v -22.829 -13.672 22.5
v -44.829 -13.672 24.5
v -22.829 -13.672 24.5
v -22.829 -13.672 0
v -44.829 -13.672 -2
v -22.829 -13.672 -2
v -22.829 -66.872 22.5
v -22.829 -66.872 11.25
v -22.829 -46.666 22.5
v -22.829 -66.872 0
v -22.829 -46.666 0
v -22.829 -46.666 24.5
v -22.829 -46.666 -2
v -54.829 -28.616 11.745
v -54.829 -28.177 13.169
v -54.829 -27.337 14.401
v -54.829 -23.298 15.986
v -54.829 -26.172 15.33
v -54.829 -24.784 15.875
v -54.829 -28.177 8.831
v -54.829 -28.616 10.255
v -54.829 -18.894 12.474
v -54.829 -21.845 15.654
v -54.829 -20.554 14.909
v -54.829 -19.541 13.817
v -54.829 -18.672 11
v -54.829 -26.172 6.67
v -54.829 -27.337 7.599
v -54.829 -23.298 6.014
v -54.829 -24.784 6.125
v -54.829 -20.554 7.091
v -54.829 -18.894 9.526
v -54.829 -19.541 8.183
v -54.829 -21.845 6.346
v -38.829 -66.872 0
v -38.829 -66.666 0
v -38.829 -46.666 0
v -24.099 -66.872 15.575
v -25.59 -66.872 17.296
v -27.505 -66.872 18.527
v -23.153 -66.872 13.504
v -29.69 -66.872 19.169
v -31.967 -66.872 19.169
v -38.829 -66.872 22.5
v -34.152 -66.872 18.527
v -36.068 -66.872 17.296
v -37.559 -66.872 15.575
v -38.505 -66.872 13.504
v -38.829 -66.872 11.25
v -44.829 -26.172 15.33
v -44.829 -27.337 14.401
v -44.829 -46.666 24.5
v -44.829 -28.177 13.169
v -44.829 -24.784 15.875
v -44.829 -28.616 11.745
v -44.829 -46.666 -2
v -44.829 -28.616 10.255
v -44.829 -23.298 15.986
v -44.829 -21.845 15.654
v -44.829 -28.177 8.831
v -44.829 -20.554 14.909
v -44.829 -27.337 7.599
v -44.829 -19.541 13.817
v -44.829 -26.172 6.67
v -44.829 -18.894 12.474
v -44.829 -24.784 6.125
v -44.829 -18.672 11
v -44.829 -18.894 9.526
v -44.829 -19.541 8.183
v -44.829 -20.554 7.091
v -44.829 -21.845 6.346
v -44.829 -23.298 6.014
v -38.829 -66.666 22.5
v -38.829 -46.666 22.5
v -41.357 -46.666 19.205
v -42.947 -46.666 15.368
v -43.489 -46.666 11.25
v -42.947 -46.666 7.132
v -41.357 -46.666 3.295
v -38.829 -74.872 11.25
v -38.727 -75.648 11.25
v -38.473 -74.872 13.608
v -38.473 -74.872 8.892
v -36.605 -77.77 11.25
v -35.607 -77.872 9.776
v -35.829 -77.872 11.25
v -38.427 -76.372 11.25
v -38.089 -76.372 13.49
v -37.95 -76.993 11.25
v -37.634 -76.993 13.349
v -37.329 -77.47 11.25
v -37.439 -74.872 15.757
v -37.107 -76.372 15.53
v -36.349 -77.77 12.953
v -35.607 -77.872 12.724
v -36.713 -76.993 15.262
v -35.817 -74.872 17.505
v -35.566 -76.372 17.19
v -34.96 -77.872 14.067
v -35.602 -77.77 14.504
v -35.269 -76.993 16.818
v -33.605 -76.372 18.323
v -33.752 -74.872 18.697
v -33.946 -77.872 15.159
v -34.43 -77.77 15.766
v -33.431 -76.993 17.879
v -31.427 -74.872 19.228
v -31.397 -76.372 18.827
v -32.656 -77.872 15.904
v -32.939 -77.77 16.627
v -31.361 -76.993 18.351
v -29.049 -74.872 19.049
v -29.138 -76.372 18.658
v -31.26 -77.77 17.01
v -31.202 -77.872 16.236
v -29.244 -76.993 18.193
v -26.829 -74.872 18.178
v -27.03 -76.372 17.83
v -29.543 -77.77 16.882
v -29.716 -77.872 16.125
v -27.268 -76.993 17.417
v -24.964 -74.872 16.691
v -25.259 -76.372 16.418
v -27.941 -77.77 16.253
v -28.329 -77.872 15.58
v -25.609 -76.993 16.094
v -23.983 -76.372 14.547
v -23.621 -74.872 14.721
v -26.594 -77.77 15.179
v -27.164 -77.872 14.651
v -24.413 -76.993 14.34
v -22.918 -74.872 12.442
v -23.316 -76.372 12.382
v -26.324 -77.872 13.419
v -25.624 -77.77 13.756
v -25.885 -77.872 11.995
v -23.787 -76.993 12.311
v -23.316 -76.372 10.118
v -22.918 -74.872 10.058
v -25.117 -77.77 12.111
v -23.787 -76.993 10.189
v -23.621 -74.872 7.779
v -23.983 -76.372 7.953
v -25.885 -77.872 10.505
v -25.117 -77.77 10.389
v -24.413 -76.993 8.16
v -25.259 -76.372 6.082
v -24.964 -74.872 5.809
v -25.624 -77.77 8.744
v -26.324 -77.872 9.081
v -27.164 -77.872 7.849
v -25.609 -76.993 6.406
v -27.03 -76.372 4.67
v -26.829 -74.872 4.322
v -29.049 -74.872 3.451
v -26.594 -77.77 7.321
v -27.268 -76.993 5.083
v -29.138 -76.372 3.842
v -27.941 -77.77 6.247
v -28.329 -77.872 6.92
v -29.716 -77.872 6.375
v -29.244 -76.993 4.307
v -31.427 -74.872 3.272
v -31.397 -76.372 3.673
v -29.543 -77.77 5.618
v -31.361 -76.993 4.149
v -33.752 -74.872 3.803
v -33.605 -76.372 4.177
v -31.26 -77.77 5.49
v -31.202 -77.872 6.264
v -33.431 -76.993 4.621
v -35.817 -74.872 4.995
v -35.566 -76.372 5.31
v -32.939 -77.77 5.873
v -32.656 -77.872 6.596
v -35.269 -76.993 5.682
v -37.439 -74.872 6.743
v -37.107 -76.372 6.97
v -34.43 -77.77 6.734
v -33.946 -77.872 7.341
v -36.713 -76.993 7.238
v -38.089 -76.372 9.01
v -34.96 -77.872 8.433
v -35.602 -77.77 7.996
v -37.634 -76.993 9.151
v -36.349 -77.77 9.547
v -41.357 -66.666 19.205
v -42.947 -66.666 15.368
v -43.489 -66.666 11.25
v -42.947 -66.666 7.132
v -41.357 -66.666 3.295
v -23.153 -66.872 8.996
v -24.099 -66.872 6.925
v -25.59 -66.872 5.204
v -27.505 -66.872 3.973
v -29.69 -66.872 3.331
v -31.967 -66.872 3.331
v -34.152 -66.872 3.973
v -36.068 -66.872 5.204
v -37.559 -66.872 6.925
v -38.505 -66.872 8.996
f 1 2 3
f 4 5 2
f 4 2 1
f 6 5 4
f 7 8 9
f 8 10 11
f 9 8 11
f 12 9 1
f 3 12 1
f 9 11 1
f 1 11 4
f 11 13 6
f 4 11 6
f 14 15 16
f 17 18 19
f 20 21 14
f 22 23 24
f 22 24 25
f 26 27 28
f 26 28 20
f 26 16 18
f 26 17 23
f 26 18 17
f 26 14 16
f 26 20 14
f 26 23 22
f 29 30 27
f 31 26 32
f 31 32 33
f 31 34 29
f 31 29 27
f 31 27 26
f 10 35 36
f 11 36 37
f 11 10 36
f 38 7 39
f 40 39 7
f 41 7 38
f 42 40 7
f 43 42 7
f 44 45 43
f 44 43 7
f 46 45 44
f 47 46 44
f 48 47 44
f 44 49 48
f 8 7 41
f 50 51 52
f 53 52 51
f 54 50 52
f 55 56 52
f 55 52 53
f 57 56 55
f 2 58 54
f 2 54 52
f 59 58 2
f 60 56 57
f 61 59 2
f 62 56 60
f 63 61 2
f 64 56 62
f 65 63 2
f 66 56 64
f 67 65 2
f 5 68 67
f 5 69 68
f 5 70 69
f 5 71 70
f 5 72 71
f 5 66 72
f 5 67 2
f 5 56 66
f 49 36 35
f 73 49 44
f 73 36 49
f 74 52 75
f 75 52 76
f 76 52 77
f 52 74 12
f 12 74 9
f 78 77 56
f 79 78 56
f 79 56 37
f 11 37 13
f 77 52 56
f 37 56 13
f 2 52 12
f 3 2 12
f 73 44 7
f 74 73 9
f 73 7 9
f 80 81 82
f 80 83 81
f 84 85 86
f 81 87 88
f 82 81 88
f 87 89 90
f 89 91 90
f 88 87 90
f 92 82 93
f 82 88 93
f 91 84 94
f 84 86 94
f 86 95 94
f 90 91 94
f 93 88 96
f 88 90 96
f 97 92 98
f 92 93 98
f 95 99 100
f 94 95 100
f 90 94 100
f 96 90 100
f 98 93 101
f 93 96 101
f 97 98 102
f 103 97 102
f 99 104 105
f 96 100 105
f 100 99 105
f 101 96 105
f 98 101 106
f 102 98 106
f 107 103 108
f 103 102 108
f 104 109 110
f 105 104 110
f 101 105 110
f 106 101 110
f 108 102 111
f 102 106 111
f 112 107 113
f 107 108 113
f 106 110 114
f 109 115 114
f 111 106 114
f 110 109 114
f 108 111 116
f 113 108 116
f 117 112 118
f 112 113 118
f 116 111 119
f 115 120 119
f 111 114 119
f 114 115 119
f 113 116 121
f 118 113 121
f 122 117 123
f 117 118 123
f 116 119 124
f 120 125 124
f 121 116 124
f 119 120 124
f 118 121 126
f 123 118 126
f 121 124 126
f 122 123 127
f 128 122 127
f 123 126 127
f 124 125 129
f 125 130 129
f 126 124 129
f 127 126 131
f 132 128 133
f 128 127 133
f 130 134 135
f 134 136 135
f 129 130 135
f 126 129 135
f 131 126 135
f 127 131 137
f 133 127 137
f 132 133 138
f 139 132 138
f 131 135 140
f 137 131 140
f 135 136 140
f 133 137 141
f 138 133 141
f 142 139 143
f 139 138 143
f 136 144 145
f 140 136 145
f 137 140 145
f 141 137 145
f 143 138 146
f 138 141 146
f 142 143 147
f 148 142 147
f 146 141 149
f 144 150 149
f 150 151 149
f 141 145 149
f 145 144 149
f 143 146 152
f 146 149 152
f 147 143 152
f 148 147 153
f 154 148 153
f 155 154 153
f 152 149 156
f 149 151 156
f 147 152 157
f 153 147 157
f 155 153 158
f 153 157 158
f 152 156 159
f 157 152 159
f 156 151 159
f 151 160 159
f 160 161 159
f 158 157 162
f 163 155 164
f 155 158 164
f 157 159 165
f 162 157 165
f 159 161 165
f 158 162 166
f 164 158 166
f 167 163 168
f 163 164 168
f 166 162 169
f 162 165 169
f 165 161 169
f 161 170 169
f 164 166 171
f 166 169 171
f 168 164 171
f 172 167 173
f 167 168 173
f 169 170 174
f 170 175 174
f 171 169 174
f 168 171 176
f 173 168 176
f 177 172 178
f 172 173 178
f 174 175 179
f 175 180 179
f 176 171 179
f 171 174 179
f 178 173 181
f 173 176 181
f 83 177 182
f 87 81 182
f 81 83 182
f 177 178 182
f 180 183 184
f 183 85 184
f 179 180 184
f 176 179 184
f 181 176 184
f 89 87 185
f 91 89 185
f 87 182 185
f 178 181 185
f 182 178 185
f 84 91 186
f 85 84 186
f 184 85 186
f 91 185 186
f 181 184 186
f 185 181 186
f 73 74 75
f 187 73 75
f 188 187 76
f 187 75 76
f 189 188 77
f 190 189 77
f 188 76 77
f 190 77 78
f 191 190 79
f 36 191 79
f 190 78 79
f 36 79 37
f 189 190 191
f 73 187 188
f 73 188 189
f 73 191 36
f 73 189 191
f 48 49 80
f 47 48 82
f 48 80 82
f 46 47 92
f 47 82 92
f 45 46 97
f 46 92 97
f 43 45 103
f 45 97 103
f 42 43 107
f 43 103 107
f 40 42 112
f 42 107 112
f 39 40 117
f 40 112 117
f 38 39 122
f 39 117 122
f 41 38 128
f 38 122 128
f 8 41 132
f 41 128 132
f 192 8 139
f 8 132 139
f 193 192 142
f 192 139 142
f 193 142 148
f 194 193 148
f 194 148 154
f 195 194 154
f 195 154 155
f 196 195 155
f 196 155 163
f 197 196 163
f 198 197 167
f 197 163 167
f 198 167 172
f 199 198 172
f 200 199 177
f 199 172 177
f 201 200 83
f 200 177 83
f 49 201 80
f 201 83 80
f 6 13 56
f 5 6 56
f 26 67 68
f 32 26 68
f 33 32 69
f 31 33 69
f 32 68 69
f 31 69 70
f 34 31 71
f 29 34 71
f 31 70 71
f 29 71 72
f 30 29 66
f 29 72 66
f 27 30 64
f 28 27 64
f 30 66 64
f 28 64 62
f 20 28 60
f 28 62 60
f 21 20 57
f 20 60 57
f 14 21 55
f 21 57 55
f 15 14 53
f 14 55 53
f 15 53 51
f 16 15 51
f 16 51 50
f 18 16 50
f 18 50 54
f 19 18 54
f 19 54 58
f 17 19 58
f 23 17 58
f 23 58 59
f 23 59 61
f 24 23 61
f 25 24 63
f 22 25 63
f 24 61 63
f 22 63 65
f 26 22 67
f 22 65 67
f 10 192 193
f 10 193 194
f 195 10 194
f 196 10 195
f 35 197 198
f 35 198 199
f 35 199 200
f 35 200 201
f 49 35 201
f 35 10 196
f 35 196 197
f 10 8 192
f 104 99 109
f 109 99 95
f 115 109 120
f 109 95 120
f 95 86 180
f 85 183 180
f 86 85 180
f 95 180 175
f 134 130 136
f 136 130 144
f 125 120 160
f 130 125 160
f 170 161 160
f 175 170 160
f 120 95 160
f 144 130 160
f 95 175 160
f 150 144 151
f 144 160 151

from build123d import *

# Parameters (mm, degrees)
ESBO_O1_W                = 20
ESBO_O1_H                = 64.2
RESSALTO_EXTRUS_O1_DEPTH = 22.5
ESBO_O2_W                = 22.5
ESBO_O2_H                = 32.994304237
RESSALTO_EXTRUS_O2_DEPTH = 2
ESBO_O3_W                = 22
ESBO_O3_H                = 32.994304237
RESSALTO_EXTRUS_O3_DEPTH = 2
ESBO_O4_W                = 22
ESBO_O4_H                = 32.994304237
RESSALTO_EXTRUS_O5_DEPTH = 2
ESBO_O5_W                = 22.5
ESBO_O5_H                = 31.205695763
CORTE_EXTRUS_O1_DEPTH    = 4
RESSALTO_EXTRUS_O6_DEPTH = 20
CORTE_EXTRUS_O2_DEPTH    = 11
FILETE1_R                = 3
ESBO_O10_R               = 5
RESSALTO_EXTRUS_O7_DEPTH = 10


with BuildPart() as part:
    # Esboço1 → Ressalto-extrusão1 (new body)
    with BuildSketch(Plane.XY):
        with Locations((-32.828798315, -45.771841795)):
            Rectangle(ESBO_O1_W, ESBO_O1_H)
    extrude(amount=RESSALTO_EXTRUS_O1_DEPTH)

    # Esboço2 → Ressalto-extrusão2 (add)
    with BuildSketch(Plane.ZY.offset(42.828798315)):
        with Locations((11.25, -30.168993913)):
            Rectangle(ESBO_O2_W, ESBO_O2_H)
    extrude(amount=RESSALTO_EXTRUS_O2_DEPTH)

    # Esboço3 → Ressalto-extrusão3 (add)
    with BuildSketch(Plane(origin=(0, 0, 0), x_dir=(-1, 0, 0), z_dir=(0, 0, -1))):
        with Locations((33.828798315, -30.168993913)):
            Rectangle(ESBO_O3_W, ESBO_O3_H)
    extrude(amount=RESSALTO_EXTRUS_O3_DEPTH)

    # Esboço4 → Ressalto-extrusão5 (add)
    with BuildSketch(Plane.XY.offset(22.5)):
        with Locations((-33.828798315, -30.168993913)):
            Rectangle(ESBO_O4_W, ESBO_O4_H)
    extrude(amount=RESSALTO_EXTRUS_O5_DEPTH)

    # Esboço5 → Corte-extrusão1 (cut)
    with BuildSketch(Plane.ZY.offset(42.828798315)):
        with Locations((11.25, -62.268993914)):
            Rectangle(ESBO_O5_W, ESBO_O5_H)
    extrude(amount=-CORTE_EXTRUS_O1_DEPTH, mode=Mode.SUBTRACT)

    # Esboço8 → Ressalto-extrusão6 (add)
    with BuildSketch(Plane.XZ.offset(46.666146032)):
        with BuildLine():
            Line((-38.828798315, 0), (-38.828798315, 22.5))
            ThreePointArc((-38.828798315, 22.5), (-43.488700892, 11.25), (-38.828798315, 0))
        make_face()
    extrude(amount=RESSALTO_EXTRUS_O6_DEPTH)

    # Esboço9 → Corte-extrusão2 (cut)
    with BuildSketch(Plane(origin=(0, -77.871841795, 0), x_dir=(-1, 0, 0), z_dir=(0, -1, 0))):
        with BuildLine():
            Line((38.828798315, -22.5), (38.828798315, -11.25))
            ThreePointArc((38.828798315, -11.25), (30.828798315, -19.25), (22.828798315, -11.25))
            Line((22.828798315, -11.25), (22.828798315, -22.5))
            Line((22.828798315, -22.5), (38.828798315, -22.5))
        make_face()
        with BuildLine():
            Line((38.828798315, -11.25), (38.828798315, 0))
            Line((38.828798315, 0), (22.828798315, 0))
            Line((22.828798315, 0), (22.828798315, -11.25))
            ThreePointArc((22.828798315, -11.25), (30.828798315, -3.25), (38.828798315, -11.25))
        make_face()
    extrude(amount=-CORTE_EXTRUS_O2_DEPTH, mode=Mode.SUBTRACT)

    # Filete1
    filete1_edges = [part.edges().sort_by_distance(p)[0] for p in [
        (-22.828798315, -77.871841795, 11.25),
    ]]
    fillet(filete1_edges, radius=FILETE1_R)

    # Esboço10 → Ressalto-extrusão7 (add)
    with BuildSketch(Plane.ZY.offset(44.828798315)):
        with Locations(Location((11, -23.671841795, 0), (0, 0, 90))):
            Circle(ESBO_O10_R)
    extrude(amount=RESSALTO_EXTRUS_O7_DEPTH)


solid = part.part
